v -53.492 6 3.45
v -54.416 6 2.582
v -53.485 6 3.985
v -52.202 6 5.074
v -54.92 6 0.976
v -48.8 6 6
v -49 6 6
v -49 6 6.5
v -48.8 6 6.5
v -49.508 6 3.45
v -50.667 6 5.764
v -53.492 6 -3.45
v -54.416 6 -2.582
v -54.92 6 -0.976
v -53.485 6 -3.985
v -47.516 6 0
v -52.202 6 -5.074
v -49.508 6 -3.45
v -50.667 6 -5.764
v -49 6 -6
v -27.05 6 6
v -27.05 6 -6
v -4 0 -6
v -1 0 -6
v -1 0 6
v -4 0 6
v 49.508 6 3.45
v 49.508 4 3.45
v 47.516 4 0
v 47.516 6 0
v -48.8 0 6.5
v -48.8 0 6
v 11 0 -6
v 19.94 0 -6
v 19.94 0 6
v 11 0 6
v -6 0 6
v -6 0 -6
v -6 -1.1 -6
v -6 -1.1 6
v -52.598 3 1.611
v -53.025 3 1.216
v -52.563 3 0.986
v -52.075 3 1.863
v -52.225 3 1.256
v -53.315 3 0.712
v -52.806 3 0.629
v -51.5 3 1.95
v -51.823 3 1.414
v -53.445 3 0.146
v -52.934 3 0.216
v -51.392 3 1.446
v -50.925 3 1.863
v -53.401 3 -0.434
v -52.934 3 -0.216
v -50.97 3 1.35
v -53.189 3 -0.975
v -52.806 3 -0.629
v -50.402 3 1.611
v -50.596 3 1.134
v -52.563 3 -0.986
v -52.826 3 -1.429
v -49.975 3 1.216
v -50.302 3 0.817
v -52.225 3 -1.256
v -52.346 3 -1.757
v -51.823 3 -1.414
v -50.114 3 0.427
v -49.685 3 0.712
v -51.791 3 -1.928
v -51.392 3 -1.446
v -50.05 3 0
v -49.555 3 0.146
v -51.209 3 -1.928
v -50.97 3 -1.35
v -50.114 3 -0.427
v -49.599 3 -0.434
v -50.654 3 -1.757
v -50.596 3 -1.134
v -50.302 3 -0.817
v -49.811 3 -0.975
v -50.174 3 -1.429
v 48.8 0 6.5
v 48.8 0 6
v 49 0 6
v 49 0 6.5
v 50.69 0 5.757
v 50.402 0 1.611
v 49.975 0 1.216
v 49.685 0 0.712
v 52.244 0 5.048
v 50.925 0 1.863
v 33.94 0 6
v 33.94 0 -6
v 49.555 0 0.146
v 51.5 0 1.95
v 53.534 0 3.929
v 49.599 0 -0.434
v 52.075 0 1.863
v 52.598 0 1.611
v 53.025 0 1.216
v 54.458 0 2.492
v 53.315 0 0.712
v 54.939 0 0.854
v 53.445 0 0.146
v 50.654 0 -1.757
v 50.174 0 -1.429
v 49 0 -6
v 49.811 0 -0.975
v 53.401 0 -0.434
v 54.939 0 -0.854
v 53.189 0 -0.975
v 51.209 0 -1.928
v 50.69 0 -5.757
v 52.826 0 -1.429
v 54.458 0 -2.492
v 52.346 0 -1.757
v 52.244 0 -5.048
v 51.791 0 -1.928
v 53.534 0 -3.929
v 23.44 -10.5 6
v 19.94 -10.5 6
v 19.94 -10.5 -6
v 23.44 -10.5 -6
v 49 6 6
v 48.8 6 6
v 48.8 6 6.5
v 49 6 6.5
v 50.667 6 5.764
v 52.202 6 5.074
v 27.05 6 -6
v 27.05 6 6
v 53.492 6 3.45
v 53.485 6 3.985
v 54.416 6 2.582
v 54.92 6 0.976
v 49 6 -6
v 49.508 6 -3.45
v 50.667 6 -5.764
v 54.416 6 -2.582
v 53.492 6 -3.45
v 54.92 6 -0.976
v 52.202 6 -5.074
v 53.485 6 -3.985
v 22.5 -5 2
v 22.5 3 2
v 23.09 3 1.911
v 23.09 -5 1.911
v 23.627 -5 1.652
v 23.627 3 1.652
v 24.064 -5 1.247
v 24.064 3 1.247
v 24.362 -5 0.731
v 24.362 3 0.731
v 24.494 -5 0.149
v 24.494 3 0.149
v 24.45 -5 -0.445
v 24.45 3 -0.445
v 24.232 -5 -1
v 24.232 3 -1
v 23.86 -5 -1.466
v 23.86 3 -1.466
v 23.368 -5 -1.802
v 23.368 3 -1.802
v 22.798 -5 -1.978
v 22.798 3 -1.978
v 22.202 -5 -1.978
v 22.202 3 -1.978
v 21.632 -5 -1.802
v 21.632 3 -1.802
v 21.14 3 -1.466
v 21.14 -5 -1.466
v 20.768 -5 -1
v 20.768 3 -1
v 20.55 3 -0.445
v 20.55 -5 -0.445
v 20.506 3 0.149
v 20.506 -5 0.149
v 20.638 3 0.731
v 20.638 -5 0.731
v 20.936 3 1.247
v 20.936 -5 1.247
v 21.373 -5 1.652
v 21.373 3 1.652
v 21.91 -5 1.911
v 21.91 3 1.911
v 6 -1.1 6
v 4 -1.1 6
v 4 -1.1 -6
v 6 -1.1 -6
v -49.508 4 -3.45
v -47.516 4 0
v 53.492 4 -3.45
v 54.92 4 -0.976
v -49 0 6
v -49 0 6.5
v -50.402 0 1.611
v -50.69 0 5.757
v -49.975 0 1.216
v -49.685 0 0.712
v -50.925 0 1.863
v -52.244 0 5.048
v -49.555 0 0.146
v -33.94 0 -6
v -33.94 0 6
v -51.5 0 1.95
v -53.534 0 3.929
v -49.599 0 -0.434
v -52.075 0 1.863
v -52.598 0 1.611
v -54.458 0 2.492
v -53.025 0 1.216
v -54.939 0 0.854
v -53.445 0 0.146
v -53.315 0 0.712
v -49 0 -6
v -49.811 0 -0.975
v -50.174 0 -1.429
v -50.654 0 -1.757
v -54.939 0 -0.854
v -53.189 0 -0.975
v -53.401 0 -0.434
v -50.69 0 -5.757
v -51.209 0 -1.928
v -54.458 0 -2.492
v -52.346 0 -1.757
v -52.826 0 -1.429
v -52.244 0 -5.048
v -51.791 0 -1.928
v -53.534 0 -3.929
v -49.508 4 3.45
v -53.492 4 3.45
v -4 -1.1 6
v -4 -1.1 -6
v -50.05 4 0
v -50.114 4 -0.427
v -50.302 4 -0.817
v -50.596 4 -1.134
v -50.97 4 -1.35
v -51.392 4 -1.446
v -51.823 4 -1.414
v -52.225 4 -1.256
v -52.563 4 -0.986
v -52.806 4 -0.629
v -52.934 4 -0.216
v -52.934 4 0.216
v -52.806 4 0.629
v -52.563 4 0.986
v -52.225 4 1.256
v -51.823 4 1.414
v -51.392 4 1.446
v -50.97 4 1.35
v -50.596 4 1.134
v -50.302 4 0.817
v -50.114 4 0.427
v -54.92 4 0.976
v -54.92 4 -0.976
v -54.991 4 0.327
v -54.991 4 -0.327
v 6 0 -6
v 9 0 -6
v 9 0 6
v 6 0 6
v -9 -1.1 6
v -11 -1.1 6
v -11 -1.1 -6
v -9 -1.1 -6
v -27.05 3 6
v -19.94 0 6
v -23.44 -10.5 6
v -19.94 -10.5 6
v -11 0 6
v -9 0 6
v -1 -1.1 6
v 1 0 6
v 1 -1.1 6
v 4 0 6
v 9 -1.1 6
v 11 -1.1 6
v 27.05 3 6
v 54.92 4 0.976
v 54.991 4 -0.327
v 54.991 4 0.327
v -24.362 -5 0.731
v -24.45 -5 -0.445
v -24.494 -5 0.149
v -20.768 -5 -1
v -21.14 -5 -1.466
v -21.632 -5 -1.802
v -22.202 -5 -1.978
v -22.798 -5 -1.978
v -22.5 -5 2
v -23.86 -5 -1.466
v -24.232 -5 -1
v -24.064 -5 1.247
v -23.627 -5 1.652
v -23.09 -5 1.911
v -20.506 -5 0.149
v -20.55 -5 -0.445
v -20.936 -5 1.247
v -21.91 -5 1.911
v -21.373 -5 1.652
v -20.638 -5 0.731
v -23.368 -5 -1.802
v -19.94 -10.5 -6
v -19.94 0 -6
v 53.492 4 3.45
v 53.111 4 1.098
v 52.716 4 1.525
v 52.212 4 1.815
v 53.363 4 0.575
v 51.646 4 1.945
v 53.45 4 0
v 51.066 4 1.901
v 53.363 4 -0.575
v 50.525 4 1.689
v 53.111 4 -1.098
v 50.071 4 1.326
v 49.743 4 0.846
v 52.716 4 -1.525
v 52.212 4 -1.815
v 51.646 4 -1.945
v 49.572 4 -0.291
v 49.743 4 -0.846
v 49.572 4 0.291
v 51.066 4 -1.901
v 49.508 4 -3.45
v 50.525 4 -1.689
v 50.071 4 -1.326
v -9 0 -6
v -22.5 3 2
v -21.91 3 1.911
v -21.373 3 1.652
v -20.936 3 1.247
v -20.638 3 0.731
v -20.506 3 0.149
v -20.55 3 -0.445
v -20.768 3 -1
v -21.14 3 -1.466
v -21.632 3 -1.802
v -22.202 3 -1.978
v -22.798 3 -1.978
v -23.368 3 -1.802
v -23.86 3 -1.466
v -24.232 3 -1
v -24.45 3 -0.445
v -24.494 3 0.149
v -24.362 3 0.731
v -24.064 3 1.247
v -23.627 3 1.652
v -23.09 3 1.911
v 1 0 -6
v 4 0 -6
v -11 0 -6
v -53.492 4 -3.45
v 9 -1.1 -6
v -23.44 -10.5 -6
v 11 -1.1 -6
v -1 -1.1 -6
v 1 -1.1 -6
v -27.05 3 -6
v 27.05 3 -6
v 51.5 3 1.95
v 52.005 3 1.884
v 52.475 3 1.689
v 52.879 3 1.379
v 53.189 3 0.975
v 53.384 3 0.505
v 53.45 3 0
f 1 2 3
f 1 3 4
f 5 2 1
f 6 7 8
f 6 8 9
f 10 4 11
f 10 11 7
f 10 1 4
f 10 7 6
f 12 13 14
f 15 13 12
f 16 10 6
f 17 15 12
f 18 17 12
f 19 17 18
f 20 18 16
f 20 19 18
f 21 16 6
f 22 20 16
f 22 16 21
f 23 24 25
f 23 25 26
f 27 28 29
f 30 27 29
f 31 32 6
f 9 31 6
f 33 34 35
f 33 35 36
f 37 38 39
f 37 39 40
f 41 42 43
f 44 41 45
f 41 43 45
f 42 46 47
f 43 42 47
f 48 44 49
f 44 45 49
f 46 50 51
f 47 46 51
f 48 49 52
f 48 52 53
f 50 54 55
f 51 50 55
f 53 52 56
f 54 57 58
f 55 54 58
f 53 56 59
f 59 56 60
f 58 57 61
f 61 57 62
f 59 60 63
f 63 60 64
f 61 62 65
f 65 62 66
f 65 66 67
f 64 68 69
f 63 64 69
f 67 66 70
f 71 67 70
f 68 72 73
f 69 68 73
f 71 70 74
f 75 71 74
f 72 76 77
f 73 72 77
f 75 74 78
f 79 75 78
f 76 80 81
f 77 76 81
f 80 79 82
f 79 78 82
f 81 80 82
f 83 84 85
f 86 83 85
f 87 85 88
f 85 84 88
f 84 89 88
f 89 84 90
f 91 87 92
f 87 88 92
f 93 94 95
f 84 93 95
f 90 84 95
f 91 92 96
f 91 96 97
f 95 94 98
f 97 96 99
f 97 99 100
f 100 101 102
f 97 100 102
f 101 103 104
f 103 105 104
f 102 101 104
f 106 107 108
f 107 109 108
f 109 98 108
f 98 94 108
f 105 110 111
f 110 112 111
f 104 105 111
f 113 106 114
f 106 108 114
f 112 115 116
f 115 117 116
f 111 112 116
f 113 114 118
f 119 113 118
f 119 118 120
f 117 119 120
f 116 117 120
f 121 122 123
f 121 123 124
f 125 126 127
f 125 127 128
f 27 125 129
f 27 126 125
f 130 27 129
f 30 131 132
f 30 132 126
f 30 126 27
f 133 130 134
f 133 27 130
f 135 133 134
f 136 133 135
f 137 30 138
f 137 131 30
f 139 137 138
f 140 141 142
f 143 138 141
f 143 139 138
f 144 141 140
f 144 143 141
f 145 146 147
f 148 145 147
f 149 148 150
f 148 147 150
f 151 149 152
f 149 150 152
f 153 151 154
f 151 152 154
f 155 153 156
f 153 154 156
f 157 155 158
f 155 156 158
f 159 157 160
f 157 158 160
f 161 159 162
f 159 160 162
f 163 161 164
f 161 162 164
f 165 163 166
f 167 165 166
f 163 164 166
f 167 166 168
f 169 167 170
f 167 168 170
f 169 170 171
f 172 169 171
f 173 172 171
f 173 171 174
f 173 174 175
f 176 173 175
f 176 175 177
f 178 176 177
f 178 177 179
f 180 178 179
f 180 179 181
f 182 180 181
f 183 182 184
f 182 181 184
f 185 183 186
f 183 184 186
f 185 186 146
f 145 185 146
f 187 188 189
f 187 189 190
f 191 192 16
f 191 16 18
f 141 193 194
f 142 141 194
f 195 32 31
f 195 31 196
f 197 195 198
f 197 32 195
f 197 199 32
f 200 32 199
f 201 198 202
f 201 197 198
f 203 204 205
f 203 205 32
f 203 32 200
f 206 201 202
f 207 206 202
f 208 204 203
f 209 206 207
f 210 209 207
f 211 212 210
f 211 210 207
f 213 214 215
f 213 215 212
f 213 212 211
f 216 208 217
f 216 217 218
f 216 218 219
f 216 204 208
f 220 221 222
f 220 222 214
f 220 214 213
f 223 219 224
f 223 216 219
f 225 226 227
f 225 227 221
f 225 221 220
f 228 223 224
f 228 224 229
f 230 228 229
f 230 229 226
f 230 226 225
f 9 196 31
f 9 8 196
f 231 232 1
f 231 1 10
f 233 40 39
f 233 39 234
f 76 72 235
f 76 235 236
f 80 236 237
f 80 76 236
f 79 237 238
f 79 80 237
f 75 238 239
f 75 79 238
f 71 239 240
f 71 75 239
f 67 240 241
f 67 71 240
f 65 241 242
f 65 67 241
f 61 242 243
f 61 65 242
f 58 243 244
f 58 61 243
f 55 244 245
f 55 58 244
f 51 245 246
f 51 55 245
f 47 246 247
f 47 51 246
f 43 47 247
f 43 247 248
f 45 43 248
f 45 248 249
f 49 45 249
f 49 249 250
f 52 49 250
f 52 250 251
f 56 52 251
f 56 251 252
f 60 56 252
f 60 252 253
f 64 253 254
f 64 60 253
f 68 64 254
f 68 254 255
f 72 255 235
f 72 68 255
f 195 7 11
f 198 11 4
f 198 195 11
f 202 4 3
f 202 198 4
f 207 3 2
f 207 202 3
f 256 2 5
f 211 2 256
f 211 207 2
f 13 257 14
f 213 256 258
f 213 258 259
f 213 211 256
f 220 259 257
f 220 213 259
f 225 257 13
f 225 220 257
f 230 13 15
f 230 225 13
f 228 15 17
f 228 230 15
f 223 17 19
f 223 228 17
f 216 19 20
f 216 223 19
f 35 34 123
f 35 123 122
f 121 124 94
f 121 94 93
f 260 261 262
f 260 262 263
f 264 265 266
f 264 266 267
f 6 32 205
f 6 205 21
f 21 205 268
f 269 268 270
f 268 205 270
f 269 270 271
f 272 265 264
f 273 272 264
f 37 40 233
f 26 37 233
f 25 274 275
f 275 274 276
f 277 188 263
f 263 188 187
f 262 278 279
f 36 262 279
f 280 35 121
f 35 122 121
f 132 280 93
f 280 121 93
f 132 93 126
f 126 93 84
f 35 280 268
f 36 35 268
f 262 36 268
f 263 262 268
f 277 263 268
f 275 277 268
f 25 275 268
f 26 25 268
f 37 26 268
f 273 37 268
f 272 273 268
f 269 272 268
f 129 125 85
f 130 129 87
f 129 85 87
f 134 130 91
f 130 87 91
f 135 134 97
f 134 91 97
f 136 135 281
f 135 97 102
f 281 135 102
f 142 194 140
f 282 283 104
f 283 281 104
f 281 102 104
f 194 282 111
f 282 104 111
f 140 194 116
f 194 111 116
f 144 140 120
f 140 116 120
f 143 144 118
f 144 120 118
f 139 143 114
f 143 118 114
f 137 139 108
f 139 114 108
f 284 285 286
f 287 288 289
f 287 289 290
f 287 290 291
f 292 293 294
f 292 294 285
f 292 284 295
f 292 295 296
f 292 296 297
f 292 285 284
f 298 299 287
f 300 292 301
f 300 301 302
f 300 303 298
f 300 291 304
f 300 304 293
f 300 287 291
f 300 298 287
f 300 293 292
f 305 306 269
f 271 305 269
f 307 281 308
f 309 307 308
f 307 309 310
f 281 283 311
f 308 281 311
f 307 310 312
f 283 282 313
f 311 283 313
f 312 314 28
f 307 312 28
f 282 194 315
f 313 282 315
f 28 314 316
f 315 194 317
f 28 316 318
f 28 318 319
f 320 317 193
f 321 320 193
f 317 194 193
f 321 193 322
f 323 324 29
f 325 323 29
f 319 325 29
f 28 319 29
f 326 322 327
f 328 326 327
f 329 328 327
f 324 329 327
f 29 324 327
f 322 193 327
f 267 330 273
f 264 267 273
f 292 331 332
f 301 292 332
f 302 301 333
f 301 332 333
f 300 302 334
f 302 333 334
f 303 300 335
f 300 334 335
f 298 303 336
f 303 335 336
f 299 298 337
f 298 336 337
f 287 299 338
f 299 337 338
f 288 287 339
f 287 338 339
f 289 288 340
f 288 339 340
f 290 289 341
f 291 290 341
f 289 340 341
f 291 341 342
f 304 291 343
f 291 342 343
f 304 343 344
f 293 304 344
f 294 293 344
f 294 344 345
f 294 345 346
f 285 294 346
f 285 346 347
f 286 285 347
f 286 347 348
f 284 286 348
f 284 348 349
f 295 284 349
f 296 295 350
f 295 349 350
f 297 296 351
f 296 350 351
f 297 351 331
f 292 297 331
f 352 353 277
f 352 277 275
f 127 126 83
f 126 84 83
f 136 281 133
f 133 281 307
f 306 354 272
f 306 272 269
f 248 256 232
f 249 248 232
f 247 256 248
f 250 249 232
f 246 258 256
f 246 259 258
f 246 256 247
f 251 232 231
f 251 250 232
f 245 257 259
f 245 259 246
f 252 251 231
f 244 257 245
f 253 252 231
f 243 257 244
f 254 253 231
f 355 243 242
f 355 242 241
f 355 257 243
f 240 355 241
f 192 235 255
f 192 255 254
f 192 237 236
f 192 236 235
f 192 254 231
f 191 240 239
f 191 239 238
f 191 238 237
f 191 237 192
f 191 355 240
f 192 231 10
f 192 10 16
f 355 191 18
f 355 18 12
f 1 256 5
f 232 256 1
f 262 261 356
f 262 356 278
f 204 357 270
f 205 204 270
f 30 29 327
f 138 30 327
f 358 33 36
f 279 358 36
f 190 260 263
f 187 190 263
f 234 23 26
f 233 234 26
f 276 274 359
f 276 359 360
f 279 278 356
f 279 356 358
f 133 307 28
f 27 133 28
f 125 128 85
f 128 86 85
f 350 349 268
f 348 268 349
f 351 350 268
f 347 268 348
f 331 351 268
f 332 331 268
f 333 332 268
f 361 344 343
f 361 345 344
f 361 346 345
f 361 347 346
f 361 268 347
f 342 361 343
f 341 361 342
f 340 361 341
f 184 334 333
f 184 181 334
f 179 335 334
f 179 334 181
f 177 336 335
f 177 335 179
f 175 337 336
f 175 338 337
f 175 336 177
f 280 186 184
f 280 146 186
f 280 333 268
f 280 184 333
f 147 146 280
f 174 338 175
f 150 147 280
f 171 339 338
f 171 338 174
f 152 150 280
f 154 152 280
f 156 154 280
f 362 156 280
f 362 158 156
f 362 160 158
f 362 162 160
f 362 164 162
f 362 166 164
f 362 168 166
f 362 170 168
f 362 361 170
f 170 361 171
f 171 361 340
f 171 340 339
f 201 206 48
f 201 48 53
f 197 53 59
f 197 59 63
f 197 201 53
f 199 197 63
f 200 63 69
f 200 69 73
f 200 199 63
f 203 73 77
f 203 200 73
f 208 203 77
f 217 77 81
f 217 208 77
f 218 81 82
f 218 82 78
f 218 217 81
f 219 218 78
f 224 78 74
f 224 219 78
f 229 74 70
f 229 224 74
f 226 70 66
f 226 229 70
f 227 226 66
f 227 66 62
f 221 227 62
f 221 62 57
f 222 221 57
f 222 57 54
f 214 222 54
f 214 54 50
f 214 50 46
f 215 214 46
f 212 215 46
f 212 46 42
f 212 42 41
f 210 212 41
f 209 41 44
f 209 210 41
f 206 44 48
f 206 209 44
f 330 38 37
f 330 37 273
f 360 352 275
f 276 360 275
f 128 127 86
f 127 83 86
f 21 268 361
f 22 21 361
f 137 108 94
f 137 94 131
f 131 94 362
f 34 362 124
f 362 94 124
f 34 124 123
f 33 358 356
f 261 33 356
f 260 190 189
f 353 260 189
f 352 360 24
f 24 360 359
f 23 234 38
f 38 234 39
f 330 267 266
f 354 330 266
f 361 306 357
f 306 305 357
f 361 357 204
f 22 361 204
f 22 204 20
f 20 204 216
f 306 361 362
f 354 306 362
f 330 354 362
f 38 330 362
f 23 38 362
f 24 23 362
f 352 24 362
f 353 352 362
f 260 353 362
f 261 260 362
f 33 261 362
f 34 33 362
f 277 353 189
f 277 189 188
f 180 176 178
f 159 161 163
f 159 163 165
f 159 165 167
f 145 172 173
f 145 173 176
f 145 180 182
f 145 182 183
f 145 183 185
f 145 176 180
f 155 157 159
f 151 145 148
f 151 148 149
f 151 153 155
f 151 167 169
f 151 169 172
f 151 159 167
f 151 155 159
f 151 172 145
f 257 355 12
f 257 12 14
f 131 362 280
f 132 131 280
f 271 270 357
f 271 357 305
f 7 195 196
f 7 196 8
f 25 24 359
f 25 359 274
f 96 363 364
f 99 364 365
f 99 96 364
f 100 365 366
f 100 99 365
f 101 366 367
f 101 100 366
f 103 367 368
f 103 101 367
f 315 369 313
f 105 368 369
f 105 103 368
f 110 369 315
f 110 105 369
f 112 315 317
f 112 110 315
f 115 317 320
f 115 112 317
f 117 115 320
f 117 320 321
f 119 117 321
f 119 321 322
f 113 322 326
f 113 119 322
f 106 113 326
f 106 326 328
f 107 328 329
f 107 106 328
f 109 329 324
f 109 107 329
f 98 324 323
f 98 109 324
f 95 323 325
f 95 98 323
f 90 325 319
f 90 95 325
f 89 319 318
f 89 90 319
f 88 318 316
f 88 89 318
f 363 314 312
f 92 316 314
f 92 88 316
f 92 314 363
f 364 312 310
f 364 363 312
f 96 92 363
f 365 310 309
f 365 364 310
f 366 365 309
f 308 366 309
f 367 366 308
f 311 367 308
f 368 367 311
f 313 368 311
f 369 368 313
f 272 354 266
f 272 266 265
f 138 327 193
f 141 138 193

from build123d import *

# Parameters (mm, degrees)
SKETCH1_R                 = 1.95
BOSS_EXTRUDE1_DEPTH       = 3
SKETCH4_W                 = 3.5
SKETCH4_H                 = 12
BOSS_EXTRUDE3_DEPTH       = 10.5
SKETCH5_W                 = 2
SKETCH5_H                 = 12
BOSS_EXTRUDE4_DEPTH       = 1.1
SKETCH6_W                 = 0.2
SKETCH6_H                 = 3
BOSS_EXTRUDE5_DEPTH       = 0.5
CHAMFER1_SIZE             = 10.5
BOSS_EXTRUDE6_OUTLINE_R   = 1.95
BOSS_EXTRUDE6_OUTLINE_R_2 = 1.45
BOSS_EXTRUDE6_DEPTH       = 3
CUT_EXTRUDE1_START        = -2
SKETCH11_R                = 1.45
CUT_EXTRUDE1_DEPTH        = 2
SKETCH13_R                = 2
CUT_EXTRUDE2_DEPTH        = 8


# Read off the part's stored shape, not the designer's step: Boss-Extrude6
with BuildPart() as part:
    # Sketch1 → Boss-Extrude1 (new body)
    with BuildSketch(Plane(origin=(0, 0, 0), x_dir=(1, 0, 0), z_dir=(0, 1, 0))):
        with BuildLine():
            Line((-49, 6), (49, 6))
            ThreePointArc((49, 6), (55, 0), (49, -6))
            Line((49, -6), (-49, -6))
            ThreePointArc((-49, -6), (-55, 0), (-49, 6))
        make_face()
        with Locations(Location((-51.5, 0, 0), (0, 0, 270))):
            Circle(SKETCH1_R, mode=Mode.SUBTRACT)
        with Locations(Location((51.5, 0, 0), (0, 0, 270))):
            Circle(SKETCH1_R, mode=Mode.SUBTRACT)
    extrude(amount=BOSS_EXTRUDE1_DEPTH)

    # Sketch4 → Boss-Extrude3 (add)
    with BuildSketch(Plane.XZ):
        with Locations((-21.690023983, 0)):
            Rectangle(SKETCH4_W, SKETCH4_H)
        with Locations((21.690023983, 0)):
            Rectangle(SKETCH4_W, SKETCH4_H)
    extrude(amount=BOSS_EXTRUDE3_DEPTH)

    # Sketch5 → Boss-Extrude4 (add)
    with BuildSketch(Plane.XZ):
        with Locations((5, 0)):
            Rectangle(SKETCH5_W, SKETCH5_H)
        Rectangle(SKETCH5_W, SKETCH5_H)
        with Locations((10, 0)):
            Rectangle(SKETCH5_W, SKETCH5_H)
        with Locations((-5, 0)):
            Rectangle(SKETCH5_W, SKETCH5_H)
        with Locations((-10, 0)):
            Rectangle(SKETCH5_W, SKETCH5_H)
    extrude(amount=BOSS_EXTRUDE4_DEPTH)

    # Sketch6 → Boss-Extrude5 (add)
    with BuildSketch(Plane.XY.offset(6)):
        with Locations((48.9, 1.5)):
            Rectangle(SKETCH6_W, SKETCH6_H)
        with Locations((-48.9, 1.5)):
            Rectangle(SKETCH6_W, SKETCH6_H)
    extrude(amount=BOSS_EXTRUDE5_DEPTH)

    # Chamfer1
    chamfer1_edges = [part.edges().sort_by_distance(p)[0] for p in [
        (23.440023983, 0, 0),
        (-23.440023983, 0, 0),
    ]]
    chamfer(chamfer1_edges, length=CHAMFER1_SIZE - 0.0001)  # a hair under: the kernel refuses the full size

    # Boss-Extrude6 outline → Boss-Extrude6 (add)
    # profile 1 of 2: a face of its own
    with BuildSketch(Plane(origin=(0, 3, 0), x_dir=(1, 0, 0), z_dir=(0, 1, 0))):
        with BuildLine():
            Line((27.05, -6), (48.8, -6))
            Line((48.8, -6), (48.8, -6.5))
            Line((48.8, -6.5), (49, -6.5))
            Line((49, -6.5), (49, -6))
            ThreePointArc((49, -6), (55, 0), (49, 6))
            Line((49, 6), (27.05, 6))
            Line((27.05, 6), (27.05, -6))
        make_face()
        with Locations((51.5, 0)):
            Circle(BOSS_EXTRUDE6_OUTLINE_R, mode=Mode.SUBTRACT)
    # profile 2 of 2: a face of its own
    with BuildSketch(Plane(origin=(0, 3, 0), x_dir=(1, 0, 0), z_dir=(0, 1, 0))):
        with BuildLine():
            Line((-48.8, -6), (-27.05, -6))
            Line((-27.05, -6), (-27.05, 6))
            Line((-27.05, 6), (-49, 6))
            ThreePointArc((-49, 6), (-55, 0), (-49, -6))
            Line((-49, -6), (-49, -6.5))
            Line((-49, -6.5), (-48.8, -6.5))
            Line((-48.8, -6.5), (-48.8, -6))
        make_face()
        with Locations((-51.5, 0)):
            Circle(BOSS_EXTRUDE6_OUTLINE_R_2, mode=Mode.SUBTRACT)
    extrude(amount=BOSS_EXTRUDE6_DEPTH)

    # Sketch11 → Cut-Extrude1 (cut)
    # profile 1 of 2: a face of its own
    with BuildSketch(Plane(origin=(0, 6, 0), x_dir=(1, 0, 0), z_dir=(0, 1, 0)).offset(CUT_EXTRUDE1_START)):
        Polygon((53.491858429, 3.45), (55.483716857, 0), (53.491858429, -3.45), (49.508141571, -3.45), (47.516283143, 0), (49.508141571, 3.45), align=None)
    # profile 2 of 2: a face of its own
    with BuildSketch(Plane(origin=(0, 6, 0), x_dir=(1, 0, 0), z_dir=(0, 1, 0)).offset(CUT_EXTRUDE1_START)):
        Polygon((-47.516283143, 0), (-49.508141571, 3.45), (-53.491858429, 3.45), (-55.483716857, 0), (-53.491858429, -3.45), (-49.508141571, -3.45), align=None)
        with Locations(Location((-51.5, 0, 0), (0, 0, 270))):
            Circle(SKETCH11_R, mode=Mode.SUBTRACT)
    extrude(amount=CUT_EXTRUDE1_DEPTH, mode=Mode.SUBTRACT)

    # Sketch13 → Cut-Extrude2 (cut)
    with BuildSketch(Plane(origin=(0, 3, 0), x_dir=(1, 0, 0), z_dir=(0, 1, 0))):
        with Locations(Location((22.5, 0, 0), (0, 0, 270))):
            Circle(SKETCH13_R)
        with Locations(Location((-22.5, 0, 0), (0, 0, 270))):
            Circle(SKETCH13_R)
    extrude(amount=-CUT_EXTRUDE2_DEPTH, mode=Mode.SUBTRACT)


solid = part.part
